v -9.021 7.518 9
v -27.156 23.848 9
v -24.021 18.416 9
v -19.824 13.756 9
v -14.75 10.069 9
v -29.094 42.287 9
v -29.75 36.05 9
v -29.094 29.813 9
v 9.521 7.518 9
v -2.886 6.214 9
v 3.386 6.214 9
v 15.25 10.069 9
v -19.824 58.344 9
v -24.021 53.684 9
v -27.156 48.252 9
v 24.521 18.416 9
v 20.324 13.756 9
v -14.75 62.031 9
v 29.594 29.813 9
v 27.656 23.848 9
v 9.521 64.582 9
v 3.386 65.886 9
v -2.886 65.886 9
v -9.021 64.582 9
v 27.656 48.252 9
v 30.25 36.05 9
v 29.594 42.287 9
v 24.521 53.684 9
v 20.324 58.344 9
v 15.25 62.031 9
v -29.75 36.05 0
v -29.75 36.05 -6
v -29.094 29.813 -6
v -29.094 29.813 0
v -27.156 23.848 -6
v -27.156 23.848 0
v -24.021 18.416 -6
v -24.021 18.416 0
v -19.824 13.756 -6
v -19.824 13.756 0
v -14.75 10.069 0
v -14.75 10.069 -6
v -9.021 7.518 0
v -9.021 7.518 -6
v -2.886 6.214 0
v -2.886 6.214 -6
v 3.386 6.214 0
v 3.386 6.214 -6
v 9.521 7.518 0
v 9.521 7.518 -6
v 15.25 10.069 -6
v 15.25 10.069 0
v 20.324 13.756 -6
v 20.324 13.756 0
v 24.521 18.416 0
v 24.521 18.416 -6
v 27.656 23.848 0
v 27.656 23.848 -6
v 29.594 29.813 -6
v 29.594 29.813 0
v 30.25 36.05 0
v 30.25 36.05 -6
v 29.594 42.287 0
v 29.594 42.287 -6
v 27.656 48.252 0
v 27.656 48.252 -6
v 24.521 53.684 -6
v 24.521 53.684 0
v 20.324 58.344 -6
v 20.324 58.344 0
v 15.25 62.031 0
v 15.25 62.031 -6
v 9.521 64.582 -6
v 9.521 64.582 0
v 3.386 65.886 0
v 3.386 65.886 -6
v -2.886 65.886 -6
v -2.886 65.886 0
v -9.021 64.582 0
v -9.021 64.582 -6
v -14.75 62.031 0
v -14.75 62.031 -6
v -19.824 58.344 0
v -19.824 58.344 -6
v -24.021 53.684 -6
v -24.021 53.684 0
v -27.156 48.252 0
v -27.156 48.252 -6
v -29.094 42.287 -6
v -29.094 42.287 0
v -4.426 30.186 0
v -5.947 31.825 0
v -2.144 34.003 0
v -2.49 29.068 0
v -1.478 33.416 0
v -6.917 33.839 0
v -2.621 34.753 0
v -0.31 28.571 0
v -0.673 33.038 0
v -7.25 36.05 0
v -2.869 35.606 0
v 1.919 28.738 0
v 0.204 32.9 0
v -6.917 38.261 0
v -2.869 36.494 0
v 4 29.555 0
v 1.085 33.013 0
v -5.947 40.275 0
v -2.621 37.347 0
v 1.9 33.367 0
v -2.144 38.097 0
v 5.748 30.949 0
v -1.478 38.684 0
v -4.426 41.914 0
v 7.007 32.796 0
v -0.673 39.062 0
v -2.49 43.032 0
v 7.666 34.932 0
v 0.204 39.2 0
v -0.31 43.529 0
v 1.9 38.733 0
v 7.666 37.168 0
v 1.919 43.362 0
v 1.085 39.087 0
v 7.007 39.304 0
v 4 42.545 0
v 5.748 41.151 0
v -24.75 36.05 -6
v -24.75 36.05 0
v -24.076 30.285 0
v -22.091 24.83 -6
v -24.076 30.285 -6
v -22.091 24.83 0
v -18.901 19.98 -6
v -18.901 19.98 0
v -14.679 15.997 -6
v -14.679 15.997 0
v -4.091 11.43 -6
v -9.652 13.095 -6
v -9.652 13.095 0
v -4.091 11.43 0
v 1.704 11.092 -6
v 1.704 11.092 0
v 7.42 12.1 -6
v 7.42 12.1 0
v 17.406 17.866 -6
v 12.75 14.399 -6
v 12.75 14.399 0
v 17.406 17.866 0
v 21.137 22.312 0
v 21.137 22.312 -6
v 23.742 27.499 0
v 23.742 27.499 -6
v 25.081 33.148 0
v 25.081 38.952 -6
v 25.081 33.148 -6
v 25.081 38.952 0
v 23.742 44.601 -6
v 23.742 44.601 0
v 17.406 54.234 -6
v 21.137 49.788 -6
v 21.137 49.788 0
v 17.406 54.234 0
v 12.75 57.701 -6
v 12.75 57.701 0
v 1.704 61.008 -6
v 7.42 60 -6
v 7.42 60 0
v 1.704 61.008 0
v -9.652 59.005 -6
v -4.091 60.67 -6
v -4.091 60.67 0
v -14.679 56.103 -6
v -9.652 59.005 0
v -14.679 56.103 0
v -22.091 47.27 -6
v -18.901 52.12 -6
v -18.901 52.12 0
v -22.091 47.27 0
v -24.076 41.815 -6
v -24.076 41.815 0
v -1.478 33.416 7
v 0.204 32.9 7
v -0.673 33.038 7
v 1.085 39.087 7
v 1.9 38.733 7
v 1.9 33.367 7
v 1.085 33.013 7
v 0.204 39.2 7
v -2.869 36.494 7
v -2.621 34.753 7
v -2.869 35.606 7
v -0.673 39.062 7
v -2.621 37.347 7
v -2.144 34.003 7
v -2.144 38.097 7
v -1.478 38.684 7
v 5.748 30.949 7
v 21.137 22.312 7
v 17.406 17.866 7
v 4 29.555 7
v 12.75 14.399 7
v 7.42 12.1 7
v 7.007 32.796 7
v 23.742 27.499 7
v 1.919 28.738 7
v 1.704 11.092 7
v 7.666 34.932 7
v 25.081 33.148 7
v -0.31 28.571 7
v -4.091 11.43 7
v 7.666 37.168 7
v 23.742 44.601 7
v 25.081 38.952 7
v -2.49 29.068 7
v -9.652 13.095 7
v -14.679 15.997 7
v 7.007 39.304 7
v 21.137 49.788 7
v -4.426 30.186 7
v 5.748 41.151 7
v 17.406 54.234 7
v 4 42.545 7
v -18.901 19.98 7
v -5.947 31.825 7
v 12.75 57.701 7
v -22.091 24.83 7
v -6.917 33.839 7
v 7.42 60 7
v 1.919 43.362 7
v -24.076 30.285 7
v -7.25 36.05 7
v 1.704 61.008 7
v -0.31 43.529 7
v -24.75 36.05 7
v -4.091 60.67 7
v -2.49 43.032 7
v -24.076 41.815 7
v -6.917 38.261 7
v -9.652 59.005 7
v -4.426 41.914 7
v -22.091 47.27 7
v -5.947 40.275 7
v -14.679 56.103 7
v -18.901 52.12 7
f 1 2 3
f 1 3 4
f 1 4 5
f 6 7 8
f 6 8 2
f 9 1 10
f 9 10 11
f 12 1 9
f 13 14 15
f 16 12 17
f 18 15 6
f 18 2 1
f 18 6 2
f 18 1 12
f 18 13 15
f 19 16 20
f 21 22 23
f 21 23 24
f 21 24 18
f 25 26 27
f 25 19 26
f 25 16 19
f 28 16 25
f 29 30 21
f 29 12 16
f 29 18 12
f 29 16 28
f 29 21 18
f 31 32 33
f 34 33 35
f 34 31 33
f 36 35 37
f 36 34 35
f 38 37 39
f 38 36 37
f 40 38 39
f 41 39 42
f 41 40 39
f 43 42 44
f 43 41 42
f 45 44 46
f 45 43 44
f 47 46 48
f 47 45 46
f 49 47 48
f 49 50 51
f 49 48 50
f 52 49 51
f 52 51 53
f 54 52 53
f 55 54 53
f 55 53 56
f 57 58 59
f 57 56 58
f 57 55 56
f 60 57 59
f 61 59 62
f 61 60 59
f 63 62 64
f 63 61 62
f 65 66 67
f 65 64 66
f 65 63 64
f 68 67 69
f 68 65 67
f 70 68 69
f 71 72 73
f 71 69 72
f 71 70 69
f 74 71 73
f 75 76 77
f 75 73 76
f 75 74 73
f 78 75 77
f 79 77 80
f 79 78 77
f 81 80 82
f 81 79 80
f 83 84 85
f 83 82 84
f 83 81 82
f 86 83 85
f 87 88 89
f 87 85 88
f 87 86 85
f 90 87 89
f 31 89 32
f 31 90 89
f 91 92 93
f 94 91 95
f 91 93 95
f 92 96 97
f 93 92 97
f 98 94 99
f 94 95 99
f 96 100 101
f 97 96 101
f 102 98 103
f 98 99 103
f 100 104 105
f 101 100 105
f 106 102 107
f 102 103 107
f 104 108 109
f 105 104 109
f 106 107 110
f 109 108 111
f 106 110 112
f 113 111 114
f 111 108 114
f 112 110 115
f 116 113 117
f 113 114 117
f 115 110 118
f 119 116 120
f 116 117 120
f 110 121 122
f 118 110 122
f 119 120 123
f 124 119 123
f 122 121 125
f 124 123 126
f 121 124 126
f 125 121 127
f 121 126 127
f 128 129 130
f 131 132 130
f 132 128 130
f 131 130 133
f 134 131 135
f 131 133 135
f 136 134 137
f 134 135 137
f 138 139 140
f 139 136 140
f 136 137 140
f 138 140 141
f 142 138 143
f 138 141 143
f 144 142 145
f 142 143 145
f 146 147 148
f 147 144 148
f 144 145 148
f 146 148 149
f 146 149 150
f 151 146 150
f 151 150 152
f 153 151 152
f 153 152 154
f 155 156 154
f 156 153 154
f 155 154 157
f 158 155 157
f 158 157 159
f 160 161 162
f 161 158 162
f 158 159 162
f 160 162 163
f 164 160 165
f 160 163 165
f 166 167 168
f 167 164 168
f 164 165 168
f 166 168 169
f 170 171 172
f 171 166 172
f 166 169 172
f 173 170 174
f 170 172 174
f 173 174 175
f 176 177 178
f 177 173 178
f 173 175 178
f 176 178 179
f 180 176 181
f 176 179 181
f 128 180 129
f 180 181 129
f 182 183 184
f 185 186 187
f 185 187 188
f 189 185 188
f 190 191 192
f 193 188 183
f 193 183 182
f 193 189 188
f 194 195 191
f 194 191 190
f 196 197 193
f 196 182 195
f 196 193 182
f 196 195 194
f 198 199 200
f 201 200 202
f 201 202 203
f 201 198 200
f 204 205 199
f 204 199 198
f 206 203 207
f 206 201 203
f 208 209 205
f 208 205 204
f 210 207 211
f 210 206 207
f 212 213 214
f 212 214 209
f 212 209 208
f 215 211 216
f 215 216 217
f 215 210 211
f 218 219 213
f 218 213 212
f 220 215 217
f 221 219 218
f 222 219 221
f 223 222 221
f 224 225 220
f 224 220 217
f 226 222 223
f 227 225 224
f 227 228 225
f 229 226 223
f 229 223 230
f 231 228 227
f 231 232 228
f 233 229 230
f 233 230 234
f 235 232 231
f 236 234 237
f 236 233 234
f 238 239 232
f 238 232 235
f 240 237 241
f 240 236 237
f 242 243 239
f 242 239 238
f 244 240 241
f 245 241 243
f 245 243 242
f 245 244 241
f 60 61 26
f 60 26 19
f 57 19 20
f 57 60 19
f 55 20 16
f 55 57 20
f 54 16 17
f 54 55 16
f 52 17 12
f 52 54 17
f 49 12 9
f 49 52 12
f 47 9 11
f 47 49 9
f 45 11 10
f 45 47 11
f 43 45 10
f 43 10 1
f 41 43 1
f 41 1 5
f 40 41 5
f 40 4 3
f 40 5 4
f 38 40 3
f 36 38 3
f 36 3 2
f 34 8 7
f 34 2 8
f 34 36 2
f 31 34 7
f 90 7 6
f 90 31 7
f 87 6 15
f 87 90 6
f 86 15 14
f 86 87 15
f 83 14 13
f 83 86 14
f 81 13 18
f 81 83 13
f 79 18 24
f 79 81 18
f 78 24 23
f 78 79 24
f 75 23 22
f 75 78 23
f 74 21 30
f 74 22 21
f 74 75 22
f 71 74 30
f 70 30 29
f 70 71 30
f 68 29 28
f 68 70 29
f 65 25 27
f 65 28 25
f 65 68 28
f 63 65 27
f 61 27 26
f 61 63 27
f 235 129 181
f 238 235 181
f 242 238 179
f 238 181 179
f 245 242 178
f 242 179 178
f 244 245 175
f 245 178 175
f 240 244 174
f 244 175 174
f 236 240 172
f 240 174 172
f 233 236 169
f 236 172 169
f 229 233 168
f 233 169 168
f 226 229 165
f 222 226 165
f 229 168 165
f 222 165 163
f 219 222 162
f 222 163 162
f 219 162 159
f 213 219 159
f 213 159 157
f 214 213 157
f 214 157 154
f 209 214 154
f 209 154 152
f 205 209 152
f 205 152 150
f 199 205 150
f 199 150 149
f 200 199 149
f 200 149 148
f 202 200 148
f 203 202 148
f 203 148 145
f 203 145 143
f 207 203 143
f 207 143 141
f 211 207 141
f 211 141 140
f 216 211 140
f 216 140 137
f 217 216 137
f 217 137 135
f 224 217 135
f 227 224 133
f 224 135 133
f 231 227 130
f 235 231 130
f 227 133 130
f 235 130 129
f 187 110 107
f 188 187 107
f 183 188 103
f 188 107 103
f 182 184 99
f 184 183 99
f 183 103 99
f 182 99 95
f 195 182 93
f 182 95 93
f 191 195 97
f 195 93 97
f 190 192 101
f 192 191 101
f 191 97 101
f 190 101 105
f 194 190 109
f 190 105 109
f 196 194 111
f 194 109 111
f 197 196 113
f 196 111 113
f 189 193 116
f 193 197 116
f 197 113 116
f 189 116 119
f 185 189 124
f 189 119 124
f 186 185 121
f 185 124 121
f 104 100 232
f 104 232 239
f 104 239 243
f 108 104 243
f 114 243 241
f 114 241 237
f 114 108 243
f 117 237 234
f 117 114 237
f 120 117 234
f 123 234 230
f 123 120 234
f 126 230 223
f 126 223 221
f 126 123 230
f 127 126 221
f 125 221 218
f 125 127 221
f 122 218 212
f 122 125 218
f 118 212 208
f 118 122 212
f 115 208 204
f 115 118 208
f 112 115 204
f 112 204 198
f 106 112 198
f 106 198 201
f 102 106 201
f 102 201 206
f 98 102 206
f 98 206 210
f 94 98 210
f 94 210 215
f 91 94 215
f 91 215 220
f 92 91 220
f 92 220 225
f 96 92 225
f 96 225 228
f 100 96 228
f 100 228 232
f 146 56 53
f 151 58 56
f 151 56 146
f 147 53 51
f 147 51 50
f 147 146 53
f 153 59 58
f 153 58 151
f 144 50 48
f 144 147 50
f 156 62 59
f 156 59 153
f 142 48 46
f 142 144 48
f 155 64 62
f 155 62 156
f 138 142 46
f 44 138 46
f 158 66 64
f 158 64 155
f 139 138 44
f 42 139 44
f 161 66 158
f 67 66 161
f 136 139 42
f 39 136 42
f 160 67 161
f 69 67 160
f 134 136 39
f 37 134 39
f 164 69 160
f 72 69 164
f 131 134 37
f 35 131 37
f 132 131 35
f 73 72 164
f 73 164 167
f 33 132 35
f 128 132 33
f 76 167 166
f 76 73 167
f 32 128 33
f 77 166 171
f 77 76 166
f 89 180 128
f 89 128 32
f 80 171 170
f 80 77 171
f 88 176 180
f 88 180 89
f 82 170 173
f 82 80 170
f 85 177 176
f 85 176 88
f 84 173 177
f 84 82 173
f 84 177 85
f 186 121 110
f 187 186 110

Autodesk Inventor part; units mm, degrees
ref_plane "YZ Plane" through (0, 0, 0) normal (1, 0, 0) x (0, 1, 0)
ref_plane "XZ Plane" through (0, 0, 0) normal (0, 1, 0) x (-1, 0, 0)
ref_plane "XY Plane" through (0, 0, 0) normal (0, 0, 1) x (1, 0, 0)
sketch "Sketch1" plane through (0, 0, 0) normal (0, 0, 1) x (1, 0, 0)
  circle A0 centre (0.25, 36.05) radius 30
  line L0 (-21, -56.05) -> (-21, -1.05) projected
  line L1 (-21, -1.05) -> (21.5, -1.05) projected
  line L2 (21.5, -1.05) -> (21.5, -56.05) projected
  line L3 (21.5, -56.05) -> (-21, -56.05) projected
  arc A1 (-41, -66.05) -> (-36, -71.05) centre (-36, -66.05) ccw projected
  line L4 (-36, -71.05) -> (36, -71.05) projected
  arc A2 (36, -71.05) -> (41, -66.05) centre (36, -66.05) ccw projected
  line L5 (41, -66.05) -> (41, 71.05) projected
  line L6 (41, 71.05) -> (-41, 71.05) projected
  line L7 (-41, 71.05) -> (-41, -66.05) projected
  circle A3 centre (-36, 66.05) radius 3.25 projected
  circle A4 centre (-36, -66.05) radius 3.25 projected
  circle A5 centre (36, 66.05) radius 3.25 projected
  circle A6 centre (36, -66.05) radius 3.25 projected
  circle A7 centre (0.25, 36.05) radius 3.75 projected
  point P0 (0, 0)
  dimension "d0" = 60
extrude "Extrusion1" add sketch "Sketch1" along normal blind 9 contours A0 | A7
sketch "Sketch2" plane through (0.25, 36.05, 0) normal (0, 0, -1) x (-1, 0, 0)
  circle A0 centre (0, 0) radius 3.15
  line L0 (-1.65, 2.6833) -> (-1.65, -2.6833)
  circle A1 centre (0, 0) radius 30 projected
  point P0 (0.25, -36.05)
  dimension "d5" = 6.3
  dimension "d6" = 4.8
  dimension "d7" = 0
extrude "Extrusion2" cut sketch "Sketch2" against normal blind 7 contours A0 L0 picked at (1.6001, 0.6823)
sketch "Sketch3" plane through (0.25, 36.05, 0) normal (0, 0, -1) x (-1, 0, 0)
  circle A0 centre (0, 0) radius 3.15
  circle A1 centre (0, 0) radius 7.5
  circle A2 centre (0, 0) radius 25
  circle A3 centre (0, 0) radius 30 projected
  point P0 (0.25, -36.05)
  dimension "d10" = 15
  dimension "d11" = 5
  dimension "d12" = 26.85
  dimension "d13" = 6.3
extrude "Extrusion3" cut sketch "Sketch3" against normal blind 7 contours A2
sketch "Sketch4" plane through (0.25, 36.05, 0) normal (0, 0, -1) x (-1, 0, 0)
  circle A0 centre (0, 0) radius 30 projected
  circle A1 centre (0, 0) radius 25 projected
  point P0 (0.25, -36.05)
extrude "Extrusion4" add sketch "Sketch4" along normal blind 6
properties part number "knob"
